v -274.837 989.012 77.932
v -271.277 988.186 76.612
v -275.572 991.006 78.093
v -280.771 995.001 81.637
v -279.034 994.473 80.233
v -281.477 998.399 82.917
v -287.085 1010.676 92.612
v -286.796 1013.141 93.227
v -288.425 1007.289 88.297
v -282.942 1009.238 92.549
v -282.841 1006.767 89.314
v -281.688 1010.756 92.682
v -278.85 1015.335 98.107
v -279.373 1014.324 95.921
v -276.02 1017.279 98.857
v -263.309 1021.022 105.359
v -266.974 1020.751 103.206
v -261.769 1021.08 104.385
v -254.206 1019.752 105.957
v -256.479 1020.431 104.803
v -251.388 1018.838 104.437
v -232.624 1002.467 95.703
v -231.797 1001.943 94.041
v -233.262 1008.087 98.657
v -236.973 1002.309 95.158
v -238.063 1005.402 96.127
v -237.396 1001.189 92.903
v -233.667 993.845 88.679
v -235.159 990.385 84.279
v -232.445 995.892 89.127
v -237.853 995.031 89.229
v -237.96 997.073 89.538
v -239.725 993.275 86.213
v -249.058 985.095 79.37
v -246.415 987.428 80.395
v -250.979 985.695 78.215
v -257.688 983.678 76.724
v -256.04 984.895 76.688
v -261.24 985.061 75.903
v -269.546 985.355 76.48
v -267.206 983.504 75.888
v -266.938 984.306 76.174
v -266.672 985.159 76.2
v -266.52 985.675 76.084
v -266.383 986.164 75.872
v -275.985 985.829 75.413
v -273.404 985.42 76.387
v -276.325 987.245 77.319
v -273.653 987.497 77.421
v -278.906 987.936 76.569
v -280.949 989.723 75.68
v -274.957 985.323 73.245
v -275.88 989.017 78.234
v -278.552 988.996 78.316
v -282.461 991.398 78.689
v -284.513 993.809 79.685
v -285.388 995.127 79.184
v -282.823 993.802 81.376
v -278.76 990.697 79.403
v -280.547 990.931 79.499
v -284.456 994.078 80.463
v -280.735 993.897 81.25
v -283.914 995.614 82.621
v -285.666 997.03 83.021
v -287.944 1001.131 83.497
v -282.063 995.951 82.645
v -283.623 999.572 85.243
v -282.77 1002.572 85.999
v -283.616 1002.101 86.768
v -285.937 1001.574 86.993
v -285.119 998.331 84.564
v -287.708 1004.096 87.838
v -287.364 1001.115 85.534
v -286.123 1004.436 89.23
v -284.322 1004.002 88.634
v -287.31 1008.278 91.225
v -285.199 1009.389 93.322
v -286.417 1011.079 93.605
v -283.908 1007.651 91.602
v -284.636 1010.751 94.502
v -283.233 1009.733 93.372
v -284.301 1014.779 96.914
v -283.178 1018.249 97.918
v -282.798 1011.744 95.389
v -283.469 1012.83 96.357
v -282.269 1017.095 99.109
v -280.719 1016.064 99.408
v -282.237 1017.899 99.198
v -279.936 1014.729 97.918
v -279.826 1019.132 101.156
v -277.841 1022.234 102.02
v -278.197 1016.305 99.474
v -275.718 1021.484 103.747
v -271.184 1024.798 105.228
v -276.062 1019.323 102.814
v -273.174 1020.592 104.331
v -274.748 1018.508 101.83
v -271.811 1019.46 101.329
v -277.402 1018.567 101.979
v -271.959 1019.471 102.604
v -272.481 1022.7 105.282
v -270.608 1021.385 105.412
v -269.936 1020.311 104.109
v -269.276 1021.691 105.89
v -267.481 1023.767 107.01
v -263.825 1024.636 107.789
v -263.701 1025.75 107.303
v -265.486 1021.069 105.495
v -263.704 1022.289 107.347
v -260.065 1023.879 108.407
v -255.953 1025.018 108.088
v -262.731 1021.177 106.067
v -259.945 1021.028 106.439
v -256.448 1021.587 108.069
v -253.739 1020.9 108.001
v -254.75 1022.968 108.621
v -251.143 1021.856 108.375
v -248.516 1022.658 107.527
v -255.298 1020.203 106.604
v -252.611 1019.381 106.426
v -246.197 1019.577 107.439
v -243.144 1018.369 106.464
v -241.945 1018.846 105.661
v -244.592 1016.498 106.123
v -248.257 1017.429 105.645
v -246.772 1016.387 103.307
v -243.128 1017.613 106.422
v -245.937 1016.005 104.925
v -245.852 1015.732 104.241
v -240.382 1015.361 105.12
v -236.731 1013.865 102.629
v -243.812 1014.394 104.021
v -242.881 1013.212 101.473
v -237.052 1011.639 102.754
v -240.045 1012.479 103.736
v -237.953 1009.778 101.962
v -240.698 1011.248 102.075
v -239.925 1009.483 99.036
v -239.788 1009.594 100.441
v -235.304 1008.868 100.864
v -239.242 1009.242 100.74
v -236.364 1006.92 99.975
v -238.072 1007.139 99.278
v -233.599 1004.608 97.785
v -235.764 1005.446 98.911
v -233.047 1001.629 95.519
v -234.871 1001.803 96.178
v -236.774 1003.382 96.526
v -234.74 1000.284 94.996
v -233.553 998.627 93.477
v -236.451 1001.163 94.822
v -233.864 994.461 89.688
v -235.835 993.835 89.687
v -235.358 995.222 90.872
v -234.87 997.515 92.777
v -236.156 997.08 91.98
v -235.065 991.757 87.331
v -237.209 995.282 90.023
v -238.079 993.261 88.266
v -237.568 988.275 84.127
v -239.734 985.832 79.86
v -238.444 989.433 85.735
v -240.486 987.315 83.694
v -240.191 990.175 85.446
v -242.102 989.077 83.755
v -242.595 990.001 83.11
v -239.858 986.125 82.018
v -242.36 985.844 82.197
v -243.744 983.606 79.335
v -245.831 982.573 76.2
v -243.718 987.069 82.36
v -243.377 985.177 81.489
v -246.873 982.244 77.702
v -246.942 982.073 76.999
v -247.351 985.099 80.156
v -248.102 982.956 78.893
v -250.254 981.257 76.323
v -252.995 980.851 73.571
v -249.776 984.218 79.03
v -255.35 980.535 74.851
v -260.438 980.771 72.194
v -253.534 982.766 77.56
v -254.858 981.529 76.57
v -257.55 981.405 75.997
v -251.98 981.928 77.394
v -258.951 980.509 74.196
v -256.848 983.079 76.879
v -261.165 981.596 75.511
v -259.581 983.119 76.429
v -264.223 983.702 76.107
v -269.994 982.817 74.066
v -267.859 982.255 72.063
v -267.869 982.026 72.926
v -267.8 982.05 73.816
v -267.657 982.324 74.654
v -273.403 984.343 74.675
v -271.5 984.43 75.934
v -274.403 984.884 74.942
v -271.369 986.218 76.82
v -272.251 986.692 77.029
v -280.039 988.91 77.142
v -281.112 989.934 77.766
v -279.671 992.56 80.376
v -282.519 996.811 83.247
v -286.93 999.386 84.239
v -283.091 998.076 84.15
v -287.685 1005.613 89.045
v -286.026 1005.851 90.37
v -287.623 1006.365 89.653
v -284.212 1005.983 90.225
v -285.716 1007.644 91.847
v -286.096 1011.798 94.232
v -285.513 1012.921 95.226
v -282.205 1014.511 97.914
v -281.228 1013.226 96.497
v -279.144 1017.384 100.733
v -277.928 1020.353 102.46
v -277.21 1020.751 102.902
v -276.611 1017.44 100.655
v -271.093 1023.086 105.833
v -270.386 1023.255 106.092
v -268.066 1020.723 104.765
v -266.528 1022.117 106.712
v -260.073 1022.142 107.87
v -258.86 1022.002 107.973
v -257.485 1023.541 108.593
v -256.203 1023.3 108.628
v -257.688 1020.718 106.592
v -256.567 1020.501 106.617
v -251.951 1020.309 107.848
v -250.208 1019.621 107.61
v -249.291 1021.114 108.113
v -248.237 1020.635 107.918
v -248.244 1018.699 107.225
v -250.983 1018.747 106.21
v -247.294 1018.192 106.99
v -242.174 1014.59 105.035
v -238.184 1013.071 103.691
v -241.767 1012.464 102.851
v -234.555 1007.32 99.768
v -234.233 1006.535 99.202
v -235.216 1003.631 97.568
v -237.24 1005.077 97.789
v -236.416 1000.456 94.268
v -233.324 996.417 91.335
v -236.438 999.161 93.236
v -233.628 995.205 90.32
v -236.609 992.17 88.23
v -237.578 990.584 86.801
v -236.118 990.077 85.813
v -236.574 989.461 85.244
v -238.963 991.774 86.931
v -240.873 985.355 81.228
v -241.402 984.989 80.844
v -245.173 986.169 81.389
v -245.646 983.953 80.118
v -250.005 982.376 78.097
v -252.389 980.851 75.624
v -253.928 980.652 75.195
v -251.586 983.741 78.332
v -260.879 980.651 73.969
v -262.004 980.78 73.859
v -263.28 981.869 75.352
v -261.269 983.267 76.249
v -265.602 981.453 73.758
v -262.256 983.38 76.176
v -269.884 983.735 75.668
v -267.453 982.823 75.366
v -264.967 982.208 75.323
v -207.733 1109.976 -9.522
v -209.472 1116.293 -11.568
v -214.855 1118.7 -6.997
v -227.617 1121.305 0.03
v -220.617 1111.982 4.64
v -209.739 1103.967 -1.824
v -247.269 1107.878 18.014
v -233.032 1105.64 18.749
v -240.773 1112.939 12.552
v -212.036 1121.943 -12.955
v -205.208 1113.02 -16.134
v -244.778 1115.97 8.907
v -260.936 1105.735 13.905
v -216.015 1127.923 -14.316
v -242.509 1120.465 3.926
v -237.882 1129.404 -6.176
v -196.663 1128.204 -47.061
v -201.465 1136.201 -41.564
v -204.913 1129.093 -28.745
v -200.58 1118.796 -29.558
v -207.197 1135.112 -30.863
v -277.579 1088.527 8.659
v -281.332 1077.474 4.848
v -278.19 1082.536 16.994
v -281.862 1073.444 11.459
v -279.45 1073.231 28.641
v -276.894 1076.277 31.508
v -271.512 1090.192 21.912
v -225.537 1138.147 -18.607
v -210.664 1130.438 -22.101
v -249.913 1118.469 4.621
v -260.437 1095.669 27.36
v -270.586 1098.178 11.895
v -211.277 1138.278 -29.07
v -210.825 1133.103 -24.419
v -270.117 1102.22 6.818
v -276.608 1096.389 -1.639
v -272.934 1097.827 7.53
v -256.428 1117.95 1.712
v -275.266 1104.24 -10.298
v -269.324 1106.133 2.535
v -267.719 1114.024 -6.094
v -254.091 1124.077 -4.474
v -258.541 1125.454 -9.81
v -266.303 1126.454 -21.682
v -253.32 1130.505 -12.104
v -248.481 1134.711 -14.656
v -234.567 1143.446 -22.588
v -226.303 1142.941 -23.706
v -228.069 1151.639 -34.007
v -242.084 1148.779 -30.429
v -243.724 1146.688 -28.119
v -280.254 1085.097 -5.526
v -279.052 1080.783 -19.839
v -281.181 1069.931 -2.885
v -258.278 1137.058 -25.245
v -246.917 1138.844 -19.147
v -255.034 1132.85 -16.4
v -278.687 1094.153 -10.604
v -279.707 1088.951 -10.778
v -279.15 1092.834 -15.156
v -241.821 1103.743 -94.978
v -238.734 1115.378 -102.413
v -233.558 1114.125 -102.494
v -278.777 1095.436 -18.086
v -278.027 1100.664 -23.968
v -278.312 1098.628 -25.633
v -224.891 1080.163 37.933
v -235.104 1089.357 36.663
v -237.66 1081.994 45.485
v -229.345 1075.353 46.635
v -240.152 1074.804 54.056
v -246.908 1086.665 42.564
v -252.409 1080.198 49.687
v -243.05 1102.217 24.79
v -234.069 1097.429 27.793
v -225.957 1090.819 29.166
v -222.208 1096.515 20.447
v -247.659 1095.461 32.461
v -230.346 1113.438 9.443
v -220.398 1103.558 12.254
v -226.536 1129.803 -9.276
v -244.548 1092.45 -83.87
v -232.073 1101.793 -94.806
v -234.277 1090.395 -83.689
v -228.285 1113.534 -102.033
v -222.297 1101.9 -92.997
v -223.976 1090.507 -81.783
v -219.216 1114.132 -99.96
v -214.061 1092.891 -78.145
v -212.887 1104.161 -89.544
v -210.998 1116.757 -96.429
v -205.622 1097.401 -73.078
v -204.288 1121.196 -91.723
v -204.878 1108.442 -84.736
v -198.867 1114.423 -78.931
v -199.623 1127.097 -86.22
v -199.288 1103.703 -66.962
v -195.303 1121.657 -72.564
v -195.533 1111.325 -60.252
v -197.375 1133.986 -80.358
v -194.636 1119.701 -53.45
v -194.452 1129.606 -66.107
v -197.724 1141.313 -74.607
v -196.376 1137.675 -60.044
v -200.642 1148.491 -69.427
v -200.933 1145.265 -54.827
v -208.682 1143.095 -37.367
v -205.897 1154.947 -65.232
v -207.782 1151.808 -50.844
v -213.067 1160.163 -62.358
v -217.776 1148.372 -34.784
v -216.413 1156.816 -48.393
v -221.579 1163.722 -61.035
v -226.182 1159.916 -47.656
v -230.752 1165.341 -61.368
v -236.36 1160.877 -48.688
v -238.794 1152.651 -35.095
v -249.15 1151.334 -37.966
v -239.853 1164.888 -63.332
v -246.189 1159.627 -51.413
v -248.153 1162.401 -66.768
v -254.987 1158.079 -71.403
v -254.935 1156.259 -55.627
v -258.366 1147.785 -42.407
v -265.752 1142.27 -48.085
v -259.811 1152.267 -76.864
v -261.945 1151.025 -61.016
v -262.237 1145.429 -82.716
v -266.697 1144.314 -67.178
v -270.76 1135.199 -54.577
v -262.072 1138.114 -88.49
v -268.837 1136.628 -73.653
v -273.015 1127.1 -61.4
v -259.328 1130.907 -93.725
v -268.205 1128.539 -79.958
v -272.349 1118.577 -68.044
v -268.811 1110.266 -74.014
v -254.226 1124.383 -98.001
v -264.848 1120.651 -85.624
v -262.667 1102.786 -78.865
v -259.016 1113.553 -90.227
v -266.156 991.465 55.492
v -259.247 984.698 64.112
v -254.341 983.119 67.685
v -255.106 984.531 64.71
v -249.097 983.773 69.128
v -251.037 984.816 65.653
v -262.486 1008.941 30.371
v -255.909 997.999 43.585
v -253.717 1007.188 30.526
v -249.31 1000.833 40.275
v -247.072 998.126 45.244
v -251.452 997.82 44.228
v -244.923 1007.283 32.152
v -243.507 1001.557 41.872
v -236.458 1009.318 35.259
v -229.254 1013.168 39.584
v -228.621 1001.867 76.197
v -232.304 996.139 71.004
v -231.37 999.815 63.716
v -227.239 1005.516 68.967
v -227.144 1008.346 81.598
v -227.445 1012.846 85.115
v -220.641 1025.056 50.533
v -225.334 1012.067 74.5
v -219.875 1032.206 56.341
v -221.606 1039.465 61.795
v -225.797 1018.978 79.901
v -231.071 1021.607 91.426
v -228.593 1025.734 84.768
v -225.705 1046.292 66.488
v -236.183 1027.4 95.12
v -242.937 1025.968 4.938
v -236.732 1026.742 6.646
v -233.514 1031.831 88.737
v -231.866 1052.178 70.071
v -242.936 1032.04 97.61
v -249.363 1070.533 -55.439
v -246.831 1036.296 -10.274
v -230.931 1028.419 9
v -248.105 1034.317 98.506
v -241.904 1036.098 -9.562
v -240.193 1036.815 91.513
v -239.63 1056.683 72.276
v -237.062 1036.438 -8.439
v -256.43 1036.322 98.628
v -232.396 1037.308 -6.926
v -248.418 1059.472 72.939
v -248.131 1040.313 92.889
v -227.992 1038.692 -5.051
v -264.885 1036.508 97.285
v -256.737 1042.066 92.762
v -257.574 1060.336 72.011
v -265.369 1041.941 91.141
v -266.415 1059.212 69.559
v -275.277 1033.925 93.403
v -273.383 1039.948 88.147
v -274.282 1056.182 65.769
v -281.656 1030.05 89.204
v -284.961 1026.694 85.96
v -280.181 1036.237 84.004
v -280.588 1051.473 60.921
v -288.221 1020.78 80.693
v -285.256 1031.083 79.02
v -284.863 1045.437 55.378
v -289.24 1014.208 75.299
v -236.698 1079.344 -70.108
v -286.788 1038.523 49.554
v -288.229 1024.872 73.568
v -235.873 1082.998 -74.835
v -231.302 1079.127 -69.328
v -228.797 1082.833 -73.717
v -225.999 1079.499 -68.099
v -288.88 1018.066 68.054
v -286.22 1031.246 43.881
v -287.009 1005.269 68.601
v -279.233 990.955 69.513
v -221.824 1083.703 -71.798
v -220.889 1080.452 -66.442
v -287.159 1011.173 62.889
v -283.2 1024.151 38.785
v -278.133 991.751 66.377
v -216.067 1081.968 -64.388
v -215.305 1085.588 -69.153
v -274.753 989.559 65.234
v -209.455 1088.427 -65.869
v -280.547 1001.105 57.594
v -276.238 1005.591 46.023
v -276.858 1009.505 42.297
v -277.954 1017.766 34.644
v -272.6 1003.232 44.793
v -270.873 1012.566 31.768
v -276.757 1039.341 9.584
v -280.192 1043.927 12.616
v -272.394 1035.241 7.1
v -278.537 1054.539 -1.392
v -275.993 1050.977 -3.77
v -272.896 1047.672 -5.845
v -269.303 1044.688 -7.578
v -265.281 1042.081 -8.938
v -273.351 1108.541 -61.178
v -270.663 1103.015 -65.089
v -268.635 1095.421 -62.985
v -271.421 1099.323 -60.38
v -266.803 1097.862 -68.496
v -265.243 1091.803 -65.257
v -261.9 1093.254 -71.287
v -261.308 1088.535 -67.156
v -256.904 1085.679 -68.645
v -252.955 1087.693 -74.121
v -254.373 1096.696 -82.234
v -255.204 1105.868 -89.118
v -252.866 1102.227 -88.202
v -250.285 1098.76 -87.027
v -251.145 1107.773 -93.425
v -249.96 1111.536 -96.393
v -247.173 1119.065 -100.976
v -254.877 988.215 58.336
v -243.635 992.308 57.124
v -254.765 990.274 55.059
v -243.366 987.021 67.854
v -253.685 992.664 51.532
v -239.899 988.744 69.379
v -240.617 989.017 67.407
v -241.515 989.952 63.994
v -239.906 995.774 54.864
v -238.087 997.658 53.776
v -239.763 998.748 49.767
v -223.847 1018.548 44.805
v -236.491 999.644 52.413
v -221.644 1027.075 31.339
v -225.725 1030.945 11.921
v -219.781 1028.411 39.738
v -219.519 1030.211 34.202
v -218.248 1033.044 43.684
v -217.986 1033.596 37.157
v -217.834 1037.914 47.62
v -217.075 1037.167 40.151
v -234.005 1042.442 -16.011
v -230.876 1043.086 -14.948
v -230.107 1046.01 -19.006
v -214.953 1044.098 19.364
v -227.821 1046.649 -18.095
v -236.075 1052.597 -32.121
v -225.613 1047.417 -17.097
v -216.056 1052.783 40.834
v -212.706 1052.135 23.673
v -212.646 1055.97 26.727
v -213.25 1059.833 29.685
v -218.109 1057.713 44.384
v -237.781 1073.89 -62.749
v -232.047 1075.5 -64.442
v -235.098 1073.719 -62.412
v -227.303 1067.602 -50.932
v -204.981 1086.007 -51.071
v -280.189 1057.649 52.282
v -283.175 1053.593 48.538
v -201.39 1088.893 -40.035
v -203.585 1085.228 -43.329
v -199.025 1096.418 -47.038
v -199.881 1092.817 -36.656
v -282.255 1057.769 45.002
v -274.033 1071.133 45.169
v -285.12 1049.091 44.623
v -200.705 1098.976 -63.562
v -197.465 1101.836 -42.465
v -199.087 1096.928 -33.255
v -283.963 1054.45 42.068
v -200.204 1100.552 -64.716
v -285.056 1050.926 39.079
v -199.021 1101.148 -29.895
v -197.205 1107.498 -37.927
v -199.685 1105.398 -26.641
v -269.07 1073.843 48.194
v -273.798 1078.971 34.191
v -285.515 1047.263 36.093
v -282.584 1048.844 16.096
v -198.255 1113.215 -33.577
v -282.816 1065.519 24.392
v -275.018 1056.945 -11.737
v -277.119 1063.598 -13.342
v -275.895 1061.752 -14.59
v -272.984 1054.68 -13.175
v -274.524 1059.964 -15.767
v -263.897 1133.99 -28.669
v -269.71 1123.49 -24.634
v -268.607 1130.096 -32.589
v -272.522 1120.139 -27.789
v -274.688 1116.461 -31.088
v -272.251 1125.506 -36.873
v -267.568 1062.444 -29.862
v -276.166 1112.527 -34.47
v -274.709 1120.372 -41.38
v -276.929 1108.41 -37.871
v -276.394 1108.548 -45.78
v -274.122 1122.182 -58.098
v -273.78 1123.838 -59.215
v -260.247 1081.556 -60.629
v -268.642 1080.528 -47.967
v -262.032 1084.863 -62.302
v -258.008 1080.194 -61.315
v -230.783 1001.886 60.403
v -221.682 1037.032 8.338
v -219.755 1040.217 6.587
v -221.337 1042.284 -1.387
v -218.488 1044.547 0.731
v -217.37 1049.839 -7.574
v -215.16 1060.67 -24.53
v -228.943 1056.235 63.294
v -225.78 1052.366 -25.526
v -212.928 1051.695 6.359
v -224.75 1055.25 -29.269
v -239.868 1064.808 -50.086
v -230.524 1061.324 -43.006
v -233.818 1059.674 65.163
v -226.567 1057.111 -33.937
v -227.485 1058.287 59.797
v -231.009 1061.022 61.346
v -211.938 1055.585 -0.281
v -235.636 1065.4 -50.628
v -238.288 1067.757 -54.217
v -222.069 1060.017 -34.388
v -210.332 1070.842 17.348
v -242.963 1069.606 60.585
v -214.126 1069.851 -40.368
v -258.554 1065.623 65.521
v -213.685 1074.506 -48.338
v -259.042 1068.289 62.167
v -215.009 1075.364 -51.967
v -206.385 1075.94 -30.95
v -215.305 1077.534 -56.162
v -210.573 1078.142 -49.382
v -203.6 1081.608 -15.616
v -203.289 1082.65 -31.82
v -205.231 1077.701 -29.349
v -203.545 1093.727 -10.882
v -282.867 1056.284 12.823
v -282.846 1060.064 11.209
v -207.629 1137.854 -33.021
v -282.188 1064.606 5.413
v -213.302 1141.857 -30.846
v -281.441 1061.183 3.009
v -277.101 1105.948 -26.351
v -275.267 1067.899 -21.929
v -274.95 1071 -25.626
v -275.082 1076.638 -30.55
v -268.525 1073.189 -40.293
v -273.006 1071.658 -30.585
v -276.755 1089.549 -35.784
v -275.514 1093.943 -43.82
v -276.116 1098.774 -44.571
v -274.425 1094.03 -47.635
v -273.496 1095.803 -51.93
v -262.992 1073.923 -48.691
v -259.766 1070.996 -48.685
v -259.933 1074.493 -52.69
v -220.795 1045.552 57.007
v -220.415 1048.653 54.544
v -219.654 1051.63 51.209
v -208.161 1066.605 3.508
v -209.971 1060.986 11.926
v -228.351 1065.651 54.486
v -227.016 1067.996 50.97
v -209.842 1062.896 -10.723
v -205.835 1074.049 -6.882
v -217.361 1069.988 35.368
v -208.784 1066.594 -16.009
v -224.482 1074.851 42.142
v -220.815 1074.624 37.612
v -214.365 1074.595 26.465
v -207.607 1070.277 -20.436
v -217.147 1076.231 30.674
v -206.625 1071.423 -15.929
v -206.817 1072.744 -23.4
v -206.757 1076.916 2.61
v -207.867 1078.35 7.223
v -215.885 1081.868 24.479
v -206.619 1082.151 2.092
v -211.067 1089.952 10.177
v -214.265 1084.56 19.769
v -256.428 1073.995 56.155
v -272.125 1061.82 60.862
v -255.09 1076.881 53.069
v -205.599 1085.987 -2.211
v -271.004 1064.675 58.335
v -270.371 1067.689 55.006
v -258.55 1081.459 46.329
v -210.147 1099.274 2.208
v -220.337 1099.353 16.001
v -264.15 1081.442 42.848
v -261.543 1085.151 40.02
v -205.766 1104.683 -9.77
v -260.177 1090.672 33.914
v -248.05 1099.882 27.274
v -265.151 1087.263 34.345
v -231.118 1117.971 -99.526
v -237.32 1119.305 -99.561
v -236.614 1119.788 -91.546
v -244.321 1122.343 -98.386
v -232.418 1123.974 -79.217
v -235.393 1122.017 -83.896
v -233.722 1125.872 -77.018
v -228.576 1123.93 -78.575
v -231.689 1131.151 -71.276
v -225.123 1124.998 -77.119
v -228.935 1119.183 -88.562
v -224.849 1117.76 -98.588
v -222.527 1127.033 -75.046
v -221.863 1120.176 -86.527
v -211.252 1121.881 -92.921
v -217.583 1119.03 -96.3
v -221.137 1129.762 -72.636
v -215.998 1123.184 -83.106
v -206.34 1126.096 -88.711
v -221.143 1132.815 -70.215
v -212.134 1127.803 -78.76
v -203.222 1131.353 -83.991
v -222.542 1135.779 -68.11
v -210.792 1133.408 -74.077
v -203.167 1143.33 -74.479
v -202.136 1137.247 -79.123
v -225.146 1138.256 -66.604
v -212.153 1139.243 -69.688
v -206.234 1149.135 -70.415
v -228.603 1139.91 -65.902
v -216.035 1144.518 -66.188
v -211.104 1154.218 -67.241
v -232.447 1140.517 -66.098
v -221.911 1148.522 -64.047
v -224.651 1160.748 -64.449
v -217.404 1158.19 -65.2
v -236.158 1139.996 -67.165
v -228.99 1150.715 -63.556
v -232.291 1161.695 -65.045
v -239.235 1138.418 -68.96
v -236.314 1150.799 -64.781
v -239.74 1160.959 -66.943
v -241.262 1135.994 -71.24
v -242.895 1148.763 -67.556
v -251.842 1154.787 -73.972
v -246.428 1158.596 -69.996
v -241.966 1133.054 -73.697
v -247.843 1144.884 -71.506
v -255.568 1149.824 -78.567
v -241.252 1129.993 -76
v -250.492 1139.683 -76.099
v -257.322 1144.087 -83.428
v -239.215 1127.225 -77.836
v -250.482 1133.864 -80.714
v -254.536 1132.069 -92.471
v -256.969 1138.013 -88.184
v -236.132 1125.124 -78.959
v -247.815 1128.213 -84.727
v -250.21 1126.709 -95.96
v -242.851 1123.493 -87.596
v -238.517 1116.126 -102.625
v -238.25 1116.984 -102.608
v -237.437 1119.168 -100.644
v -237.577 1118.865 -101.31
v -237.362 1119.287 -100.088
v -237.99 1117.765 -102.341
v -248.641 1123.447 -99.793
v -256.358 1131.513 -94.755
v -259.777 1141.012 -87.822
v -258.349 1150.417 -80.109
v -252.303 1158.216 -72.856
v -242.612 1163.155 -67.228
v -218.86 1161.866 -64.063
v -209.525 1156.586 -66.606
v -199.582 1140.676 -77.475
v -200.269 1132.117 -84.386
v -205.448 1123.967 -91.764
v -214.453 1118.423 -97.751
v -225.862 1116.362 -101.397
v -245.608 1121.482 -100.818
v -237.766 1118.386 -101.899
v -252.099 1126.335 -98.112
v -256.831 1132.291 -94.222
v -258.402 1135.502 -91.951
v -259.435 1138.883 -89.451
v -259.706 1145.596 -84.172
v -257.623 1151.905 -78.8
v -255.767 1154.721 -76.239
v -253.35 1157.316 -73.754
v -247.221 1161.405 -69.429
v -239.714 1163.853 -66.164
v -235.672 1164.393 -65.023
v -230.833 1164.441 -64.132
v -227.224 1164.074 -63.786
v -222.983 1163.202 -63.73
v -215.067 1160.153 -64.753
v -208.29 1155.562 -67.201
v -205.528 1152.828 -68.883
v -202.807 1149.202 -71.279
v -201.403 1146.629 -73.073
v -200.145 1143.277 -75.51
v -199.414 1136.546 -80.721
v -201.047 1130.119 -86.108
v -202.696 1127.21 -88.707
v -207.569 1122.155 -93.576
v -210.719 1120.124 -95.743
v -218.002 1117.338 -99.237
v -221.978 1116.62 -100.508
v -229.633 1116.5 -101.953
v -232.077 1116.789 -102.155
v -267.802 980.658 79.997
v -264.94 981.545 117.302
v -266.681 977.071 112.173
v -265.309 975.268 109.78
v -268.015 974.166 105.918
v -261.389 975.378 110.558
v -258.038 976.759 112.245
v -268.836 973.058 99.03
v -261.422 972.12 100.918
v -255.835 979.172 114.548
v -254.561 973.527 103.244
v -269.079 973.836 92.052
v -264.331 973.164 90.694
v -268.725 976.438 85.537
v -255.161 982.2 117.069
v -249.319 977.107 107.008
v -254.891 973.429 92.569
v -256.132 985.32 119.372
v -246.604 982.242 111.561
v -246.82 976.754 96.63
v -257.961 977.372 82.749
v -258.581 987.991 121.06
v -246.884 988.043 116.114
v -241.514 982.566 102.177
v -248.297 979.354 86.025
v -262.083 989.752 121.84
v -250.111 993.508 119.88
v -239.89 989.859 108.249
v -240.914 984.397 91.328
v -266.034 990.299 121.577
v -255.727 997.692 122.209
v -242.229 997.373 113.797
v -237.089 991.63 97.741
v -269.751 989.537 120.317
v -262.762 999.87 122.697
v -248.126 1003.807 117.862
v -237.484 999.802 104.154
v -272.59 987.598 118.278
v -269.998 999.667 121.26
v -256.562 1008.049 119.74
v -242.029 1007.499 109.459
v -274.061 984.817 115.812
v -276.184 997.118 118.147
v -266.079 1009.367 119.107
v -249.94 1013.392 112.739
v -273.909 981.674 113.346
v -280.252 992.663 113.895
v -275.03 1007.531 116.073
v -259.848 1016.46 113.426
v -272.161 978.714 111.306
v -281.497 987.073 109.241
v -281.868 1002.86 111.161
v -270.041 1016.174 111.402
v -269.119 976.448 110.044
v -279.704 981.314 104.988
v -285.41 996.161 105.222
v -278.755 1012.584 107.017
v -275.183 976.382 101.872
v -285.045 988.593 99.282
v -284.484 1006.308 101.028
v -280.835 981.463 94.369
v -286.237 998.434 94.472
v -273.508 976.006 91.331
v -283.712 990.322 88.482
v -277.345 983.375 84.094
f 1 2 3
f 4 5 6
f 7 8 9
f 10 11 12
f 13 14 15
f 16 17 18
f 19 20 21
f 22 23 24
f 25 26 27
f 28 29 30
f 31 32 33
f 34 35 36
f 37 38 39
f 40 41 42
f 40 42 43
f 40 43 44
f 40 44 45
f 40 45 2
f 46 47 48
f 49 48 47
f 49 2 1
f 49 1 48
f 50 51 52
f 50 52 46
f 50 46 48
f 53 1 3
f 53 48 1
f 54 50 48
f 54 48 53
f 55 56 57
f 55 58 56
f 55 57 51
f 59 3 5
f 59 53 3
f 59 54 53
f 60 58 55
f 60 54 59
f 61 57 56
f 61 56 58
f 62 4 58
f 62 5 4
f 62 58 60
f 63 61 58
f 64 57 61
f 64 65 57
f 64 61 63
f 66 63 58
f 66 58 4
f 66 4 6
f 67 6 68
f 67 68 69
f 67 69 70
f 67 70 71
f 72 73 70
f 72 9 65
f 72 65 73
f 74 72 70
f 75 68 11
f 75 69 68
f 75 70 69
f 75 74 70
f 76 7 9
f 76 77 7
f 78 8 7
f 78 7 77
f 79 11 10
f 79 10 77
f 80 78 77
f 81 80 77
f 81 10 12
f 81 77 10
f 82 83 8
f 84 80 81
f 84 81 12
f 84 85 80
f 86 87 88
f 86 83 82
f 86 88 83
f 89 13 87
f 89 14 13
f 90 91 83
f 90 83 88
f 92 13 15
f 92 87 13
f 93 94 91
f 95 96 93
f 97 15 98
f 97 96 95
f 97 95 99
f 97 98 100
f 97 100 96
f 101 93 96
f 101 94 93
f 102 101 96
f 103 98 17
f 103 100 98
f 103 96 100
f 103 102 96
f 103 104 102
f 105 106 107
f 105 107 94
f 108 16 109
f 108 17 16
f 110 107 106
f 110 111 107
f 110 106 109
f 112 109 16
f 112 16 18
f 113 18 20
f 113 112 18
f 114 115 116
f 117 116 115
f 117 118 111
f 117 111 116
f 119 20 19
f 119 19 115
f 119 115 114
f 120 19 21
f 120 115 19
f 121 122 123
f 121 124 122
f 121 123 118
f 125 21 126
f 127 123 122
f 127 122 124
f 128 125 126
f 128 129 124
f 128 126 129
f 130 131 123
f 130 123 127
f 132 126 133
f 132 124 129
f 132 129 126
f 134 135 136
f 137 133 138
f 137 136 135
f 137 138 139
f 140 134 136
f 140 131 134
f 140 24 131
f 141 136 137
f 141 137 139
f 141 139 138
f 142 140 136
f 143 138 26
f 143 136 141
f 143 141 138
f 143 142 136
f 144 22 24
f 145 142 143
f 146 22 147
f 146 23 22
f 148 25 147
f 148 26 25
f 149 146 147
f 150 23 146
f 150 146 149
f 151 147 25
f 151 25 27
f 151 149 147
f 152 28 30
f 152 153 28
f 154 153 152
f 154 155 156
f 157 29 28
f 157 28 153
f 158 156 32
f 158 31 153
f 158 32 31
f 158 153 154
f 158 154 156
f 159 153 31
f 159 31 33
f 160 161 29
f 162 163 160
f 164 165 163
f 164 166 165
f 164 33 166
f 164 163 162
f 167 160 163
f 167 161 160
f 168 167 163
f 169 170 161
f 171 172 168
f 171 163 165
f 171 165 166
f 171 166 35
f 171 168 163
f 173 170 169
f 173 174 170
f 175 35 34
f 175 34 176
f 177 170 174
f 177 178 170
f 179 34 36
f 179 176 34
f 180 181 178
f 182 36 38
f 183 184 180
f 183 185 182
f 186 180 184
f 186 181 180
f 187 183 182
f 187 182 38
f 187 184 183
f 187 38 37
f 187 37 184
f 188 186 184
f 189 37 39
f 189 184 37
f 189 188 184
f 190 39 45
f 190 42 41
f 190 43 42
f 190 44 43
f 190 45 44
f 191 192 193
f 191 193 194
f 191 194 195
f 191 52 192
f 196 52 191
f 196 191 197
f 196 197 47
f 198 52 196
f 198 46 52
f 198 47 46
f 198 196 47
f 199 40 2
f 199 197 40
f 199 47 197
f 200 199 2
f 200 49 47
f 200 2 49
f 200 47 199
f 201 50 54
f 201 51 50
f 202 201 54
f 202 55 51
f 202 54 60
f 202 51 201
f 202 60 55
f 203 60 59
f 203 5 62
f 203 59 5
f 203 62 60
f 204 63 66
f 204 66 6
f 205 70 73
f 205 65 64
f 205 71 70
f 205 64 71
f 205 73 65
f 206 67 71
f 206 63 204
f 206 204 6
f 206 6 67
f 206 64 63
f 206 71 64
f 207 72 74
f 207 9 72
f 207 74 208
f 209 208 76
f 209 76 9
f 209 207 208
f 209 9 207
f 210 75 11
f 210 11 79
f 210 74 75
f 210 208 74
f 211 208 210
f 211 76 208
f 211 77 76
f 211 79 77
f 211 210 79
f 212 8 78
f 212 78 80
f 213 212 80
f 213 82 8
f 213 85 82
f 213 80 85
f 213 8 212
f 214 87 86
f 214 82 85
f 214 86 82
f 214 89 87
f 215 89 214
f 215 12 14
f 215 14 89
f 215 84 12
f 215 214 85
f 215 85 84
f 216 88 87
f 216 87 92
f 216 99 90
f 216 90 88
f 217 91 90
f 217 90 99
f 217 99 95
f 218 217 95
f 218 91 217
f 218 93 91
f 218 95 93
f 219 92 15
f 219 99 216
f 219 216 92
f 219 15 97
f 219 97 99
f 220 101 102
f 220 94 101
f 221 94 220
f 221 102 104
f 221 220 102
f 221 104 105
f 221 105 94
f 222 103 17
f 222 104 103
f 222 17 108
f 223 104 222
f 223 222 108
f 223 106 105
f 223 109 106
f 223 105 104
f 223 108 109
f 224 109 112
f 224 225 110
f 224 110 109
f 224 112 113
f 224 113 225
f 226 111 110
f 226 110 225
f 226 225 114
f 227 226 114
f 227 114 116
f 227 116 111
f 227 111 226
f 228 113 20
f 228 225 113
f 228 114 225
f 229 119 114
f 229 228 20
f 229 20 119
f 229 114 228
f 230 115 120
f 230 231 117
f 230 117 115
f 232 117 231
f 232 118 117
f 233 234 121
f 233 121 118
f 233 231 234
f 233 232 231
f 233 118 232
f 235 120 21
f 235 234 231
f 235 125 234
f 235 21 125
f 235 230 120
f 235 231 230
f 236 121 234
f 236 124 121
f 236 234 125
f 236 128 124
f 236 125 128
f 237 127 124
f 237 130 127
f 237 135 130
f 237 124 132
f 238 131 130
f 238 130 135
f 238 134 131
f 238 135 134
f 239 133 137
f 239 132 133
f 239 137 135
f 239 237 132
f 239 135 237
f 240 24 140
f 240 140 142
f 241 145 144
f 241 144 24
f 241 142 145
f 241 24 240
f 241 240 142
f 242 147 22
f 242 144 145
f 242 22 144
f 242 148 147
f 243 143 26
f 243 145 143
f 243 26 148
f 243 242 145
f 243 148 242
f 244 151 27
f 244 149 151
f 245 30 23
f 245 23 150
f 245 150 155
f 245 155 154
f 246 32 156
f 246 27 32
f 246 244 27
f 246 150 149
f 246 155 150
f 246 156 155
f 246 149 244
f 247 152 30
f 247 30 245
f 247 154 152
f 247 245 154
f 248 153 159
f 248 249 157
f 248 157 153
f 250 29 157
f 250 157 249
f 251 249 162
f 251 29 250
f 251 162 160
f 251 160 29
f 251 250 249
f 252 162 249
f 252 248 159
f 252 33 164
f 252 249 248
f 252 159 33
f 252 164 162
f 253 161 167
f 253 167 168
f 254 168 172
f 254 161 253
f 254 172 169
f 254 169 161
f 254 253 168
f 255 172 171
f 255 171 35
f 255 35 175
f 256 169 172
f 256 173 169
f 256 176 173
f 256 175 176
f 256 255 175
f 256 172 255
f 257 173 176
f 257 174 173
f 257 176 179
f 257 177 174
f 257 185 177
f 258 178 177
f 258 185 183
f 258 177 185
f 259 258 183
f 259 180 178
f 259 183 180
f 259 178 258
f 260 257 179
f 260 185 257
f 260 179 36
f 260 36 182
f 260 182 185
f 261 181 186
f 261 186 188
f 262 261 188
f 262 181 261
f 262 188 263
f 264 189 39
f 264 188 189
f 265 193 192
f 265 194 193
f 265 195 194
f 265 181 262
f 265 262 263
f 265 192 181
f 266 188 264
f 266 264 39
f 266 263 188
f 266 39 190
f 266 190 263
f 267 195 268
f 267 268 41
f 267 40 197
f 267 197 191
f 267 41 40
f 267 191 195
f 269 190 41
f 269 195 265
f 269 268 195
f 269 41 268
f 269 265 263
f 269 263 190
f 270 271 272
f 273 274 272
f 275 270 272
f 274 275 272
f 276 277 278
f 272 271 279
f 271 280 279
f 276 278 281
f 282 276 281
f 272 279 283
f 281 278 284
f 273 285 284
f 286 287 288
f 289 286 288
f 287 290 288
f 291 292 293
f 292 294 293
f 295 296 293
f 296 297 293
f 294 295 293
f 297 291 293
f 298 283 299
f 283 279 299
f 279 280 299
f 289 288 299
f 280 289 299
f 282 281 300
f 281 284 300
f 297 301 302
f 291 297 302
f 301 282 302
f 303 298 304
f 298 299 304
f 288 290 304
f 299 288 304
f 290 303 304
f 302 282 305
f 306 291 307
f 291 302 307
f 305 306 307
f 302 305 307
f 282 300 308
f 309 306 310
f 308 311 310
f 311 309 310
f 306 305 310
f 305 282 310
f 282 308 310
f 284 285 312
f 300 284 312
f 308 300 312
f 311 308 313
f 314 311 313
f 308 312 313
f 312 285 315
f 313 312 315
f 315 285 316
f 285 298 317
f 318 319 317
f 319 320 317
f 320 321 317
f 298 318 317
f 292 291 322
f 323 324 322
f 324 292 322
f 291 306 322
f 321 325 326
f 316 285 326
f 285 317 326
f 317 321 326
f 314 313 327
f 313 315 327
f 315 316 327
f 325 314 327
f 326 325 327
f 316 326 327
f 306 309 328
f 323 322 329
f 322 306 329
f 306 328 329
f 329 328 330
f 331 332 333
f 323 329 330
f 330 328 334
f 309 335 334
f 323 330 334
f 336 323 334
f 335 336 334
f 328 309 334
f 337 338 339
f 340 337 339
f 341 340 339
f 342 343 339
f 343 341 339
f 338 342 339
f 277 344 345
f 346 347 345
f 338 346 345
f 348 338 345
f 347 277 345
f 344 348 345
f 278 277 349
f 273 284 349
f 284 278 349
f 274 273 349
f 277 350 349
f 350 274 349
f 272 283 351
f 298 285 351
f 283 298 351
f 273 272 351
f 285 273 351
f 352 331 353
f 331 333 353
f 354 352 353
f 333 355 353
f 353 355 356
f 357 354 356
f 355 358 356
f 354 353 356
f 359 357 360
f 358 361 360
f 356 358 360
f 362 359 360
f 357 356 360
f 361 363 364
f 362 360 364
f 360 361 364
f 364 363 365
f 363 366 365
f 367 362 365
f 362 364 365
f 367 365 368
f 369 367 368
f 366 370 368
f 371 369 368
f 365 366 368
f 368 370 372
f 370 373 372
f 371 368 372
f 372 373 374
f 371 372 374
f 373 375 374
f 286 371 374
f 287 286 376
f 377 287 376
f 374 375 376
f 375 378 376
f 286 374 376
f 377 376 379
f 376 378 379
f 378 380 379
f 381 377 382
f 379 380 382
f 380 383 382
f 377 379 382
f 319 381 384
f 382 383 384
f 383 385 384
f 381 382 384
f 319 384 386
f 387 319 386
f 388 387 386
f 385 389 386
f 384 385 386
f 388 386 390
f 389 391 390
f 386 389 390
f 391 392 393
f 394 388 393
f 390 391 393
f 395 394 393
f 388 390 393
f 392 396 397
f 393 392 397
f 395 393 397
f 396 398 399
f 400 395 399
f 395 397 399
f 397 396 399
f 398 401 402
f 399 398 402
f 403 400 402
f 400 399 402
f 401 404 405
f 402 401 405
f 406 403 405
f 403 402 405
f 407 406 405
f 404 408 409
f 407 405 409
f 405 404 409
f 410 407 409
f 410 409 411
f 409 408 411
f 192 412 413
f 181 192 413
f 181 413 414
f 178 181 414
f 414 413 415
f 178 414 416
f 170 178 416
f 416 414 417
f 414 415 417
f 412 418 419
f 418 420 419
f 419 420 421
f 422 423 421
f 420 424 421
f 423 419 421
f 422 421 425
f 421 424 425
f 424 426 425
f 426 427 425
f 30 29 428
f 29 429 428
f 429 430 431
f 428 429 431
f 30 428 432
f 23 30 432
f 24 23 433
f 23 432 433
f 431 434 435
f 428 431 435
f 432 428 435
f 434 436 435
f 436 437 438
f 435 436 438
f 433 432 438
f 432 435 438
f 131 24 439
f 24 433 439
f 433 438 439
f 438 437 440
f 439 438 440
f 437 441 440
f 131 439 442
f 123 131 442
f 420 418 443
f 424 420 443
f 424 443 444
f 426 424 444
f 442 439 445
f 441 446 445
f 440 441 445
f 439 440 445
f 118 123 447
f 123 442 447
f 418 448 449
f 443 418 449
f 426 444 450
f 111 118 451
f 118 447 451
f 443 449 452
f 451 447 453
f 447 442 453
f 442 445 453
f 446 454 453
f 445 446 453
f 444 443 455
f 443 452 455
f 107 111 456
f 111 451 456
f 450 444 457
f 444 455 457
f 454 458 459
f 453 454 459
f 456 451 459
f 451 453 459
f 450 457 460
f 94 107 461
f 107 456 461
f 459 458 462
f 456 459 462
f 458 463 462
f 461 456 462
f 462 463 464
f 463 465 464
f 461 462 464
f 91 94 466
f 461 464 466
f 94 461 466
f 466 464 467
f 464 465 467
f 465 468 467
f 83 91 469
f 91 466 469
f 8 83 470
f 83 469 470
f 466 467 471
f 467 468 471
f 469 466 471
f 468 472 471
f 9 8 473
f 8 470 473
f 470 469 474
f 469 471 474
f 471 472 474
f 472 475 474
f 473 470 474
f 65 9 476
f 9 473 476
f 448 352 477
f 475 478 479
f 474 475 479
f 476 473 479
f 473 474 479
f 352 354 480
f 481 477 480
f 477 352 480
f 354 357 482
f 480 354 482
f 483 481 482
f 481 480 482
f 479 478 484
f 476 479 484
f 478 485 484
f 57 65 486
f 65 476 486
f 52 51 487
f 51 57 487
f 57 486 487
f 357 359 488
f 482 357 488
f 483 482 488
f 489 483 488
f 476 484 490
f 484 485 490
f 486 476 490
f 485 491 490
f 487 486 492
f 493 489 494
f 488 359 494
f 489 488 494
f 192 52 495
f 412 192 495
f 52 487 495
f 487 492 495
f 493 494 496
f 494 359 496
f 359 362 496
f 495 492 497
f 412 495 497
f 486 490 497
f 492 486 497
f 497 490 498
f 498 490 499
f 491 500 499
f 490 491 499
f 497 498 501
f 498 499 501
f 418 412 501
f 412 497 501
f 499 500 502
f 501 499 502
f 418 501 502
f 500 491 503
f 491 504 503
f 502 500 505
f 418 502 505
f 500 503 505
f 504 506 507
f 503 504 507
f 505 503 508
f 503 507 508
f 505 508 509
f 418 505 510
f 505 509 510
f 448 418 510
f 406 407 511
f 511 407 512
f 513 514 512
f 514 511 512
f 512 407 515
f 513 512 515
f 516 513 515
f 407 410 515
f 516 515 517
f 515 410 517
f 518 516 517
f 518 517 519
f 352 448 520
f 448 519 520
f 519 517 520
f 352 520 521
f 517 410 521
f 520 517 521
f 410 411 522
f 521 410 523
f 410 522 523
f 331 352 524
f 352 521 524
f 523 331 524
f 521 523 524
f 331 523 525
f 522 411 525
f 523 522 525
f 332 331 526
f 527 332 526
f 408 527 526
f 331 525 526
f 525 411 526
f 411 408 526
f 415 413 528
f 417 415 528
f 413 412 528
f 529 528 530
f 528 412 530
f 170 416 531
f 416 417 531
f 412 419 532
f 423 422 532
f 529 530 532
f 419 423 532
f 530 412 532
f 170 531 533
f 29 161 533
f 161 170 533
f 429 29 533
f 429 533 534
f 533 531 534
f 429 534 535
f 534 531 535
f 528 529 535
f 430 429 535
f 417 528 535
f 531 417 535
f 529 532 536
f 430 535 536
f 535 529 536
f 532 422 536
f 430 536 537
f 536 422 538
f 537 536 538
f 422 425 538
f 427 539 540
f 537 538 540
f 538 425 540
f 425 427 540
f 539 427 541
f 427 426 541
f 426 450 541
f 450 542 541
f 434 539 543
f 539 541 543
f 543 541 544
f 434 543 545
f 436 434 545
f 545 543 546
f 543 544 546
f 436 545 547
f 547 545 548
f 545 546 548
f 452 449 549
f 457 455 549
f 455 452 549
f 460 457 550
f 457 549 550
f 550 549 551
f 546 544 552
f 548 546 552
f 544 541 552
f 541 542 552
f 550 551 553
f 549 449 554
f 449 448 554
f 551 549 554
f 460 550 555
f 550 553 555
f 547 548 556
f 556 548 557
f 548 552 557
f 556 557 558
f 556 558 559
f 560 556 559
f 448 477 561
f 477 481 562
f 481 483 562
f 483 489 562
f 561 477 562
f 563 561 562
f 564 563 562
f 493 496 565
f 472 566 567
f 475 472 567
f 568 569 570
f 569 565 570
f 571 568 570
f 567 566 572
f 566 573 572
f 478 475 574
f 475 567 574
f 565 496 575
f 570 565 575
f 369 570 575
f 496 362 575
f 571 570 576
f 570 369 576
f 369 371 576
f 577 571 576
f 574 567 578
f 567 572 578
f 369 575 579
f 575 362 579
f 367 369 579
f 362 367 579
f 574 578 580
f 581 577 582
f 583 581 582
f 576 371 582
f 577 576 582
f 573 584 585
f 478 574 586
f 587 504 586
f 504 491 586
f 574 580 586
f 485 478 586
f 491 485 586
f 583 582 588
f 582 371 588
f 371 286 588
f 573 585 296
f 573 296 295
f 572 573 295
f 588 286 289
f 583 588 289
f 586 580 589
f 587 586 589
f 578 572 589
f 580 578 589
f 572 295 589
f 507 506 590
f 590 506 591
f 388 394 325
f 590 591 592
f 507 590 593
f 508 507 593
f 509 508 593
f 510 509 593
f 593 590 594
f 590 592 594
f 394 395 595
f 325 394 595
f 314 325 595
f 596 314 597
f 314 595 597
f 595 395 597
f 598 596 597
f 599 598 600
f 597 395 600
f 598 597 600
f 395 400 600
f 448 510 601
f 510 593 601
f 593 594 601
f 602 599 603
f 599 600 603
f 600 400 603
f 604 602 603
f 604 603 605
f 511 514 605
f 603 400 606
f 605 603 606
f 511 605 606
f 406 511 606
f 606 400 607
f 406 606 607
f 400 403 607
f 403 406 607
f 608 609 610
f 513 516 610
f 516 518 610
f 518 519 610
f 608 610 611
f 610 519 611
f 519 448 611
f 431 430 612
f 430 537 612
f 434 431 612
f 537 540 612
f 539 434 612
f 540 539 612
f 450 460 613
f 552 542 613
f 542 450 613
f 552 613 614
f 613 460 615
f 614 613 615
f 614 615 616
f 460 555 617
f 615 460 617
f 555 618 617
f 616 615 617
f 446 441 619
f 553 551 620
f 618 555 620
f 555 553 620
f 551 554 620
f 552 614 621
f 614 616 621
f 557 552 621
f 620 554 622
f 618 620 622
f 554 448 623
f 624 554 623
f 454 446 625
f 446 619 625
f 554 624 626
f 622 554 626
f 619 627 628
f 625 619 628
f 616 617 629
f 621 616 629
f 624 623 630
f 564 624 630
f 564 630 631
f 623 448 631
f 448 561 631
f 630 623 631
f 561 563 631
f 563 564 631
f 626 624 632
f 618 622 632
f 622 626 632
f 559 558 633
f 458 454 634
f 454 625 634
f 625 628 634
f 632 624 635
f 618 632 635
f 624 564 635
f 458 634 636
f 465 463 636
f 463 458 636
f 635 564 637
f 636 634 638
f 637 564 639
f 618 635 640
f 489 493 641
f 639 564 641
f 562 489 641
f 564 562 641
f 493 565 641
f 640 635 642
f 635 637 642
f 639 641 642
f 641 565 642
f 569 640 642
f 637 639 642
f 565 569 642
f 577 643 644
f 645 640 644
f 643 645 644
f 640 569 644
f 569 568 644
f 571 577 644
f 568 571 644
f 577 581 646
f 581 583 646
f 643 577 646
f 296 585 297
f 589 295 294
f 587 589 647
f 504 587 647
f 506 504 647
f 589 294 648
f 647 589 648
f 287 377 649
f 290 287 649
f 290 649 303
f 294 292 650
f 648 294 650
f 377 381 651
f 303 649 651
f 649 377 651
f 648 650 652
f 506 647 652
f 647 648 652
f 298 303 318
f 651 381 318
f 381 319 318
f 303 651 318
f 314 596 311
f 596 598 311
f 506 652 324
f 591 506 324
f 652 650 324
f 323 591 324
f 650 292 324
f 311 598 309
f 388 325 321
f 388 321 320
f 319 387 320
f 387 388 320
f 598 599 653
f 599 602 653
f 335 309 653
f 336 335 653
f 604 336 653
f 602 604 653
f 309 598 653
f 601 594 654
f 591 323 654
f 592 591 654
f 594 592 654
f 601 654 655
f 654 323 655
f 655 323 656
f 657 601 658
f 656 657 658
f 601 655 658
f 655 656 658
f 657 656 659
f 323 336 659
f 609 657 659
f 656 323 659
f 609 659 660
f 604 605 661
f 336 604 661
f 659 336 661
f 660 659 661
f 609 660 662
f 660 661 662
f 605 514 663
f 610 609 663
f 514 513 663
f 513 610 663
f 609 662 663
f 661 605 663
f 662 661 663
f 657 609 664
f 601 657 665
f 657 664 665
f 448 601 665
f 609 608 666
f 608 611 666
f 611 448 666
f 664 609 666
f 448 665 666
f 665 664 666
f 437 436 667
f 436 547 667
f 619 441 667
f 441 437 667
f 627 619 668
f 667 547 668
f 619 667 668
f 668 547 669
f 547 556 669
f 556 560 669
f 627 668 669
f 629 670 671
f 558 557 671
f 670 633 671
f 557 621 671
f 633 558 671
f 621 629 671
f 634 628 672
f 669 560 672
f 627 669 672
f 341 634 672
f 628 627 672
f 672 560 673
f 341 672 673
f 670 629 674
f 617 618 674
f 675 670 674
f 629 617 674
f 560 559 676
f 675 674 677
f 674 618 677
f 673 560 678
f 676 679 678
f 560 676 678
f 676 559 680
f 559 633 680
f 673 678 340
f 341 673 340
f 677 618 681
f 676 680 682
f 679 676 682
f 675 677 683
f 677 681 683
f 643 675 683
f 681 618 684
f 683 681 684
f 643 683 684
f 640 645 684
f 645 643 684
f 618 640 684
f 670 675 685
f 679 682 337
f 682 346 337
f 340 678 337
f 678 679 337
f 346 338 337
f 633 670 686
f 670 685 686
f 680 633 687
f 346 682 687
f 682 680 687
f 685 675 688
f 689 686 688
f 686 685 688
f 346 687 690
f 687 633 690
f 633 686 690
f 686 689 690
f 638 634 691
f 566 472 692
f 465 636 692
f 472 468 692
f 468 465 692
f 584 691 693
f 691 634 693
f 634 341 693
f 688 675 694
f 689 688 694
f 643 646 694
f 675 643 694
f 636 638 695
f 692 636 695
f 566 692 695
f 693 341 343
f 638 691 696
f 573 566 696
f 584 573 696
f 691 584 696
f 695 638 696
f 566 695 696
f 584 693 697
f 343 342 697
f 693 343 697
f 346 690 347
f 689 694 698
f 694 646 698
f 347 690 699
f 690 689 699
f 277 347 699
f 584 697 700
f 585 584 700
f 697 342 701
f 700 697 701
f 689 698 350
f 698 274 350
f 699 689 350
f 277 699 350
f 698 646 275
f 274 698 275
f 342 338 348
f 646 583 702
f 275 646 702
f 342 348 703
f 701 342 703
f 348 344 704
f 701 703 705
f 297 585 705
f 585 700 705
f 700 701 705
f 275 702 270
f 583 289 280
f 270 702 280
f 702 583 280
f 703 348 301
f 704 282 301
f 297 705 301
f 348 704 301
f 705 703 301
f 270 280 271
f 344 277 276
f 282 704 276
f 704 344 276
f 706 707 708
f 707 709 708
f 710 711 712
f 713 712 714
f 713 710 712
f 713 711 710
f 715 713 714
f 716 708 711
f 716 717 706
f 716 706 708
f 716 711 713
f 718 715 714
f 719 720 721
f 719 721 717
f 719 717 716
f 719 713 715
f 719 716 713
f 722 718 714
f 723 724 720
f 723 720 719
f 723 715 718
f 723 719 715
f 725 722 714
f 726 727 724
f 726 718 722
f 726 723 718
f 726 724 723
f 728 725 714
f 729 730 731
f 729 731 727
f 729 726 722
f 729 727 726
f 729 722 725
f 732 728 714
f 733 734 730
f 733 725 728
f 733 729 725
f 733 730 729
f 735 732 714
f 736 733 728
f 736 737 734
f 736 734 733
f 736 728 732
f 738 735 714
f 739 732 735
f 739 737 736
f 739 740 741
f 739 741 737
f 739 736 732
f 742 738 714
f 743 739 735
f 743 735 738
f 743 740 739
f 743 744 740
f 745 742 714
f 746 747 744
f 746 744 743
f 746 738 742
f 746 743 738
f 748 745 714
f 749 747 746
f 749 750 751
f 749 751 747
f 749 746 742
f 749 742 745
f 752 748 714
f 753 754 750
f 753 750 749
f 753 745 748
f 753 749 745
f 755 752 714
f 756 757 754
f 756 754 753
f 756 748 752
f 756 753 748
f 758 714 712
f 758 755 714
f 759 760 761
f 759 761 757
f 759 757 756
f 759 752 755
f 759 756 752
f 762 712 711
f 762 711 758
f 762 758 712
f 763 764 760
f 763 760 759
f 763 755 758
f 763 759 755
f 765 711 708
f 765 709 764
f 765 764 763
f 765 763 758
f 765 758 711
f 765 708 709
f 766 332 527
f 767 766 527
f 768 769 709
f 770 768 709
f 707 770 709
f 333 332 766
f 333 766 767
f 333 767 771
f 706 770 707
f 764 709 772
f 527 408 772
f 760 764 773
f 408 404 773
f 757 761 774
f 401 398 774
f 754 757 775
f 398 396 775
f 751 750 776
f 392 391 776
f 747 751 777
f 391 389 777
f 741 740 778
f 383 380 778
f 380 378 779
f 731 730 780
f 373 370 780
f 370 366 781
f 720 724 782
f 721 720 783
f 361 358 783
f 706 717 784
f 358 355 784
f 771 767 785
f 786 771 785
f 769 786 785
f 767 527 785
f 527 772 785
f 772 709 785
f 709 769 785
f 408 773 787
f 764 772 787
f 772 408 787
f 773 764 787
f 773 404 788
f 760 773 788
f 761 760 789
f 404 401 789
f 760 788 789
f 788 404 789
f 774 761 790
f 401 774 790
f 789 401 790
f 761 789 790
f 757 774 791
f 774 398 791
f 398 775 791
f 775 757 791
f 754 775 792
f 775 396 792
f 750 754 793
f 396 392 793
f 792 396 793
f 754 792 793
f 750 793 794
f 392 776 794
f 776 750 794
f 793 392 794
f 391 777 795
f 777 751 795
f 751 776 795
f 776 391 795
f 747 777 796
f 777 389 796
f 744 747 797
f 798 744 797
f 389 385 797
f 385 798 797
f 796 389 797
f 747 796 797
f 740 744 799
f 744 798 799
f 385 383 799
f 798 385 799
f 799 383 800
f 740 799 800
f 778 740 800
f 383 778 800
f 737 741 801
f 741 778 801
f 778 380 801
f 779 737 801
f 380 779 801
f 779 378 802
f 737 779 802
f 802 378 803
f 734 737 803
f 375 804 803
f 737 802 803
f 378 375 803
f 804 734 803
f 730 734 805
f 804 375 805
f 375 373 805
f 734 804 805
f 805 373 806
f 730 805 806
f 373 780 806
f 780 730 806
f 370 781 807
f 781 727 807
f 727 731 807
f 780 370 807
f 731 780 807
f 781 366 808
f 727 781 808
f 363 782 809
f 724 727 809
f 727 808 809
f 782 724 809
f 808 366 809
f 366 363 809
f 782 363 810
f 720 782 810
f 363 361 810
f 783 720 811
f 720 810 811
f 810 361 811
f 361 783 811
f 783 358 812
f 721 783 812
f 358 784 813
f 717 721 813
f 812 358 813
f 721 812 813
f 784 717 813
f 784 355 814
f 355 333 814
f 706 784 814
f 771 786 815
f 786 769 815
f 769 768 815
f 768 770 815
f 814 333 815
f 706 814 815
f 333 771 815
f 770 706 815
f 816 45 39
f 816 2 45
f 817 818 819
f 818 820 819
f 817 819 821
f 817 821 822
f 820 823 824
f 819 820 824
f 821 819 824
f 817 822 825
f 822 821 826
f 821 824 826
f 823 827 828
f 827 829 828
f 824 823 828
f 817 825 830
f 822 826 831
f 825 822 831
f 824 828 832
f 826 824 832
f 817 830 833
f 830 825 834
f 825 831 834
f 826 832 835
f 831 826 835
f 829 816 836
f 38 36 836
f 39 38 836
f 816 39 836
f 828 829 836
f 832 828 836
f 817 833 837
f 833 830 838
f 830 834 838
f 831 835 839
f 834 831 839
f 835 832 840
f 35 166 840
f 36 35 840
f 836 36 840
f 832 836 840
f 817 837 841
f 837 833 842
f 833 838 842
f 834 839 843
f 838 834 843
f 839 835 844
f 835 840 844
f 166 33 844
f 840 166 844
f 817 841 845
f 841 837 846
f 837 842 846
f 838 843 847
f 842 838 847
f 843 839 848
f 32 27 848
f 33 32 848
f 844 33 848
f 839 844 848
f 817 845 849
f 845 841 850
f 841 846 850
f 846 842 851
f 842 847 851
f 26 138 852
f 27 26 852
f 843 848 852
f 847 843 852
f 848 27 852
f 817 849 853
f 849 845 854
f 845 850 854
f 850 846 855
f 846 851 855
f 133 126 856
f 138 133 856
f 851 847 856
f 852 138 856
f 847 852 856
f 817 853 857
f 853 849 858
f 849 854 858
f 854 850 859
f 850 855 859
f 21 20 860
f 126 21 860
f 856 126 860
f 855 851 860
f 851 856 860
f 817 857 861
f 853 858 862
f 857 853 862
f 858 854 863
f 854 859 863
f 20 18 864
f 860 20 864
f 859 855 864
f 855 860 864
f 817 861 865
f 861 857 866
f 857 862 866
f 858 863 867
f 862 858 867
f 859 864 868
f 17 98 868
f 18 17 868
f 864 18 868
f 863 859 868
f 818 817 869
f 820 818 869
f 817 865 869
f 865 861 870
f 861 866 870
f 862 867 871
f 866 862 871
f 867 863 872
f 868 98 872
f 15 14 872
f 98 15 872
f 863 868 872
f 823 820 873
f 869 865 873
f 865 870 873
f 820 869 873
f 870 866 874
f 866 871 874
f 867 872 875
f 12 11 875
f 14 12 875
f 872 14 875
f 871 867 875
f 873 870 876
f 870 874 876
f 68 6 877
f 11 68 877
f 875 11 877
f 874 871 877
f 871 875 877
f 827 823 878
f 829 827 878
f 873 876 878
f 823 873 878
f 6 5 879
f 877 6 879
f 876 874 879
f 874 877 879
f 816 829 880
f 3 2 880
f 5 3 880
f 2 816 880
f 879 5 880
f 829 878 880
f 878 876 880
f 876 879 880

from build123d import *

# Parameters (mm, degrees)
FILLET093_R             = 3
FILLET094_R             = 3
BODY056_ROLL_ANGLE      = -96.018155
BODY056_PITCH_ANGLE     = -50.899336
BODY056_PLACEMENT_ANGLE = -102.530845


with BuildPart() as part:
    # Sketch188 → Revolution097 (revolve)
    with BuildSketch(Plane.XY):
        with BuildLine():
            Line((5.147949, 0), (267.265, 0))
            add(Edge.make_bspline(
                [(267.265, 0), (263.840897, 29.07099), (216.842712, 33.126465), (91.435905, 38.640092), (3.238657, 43.599544), (5.147949, 0)],
                knots=[0, 0, 0, 0, 0.333333, 0.666667, 1, 1, 1, 1], degree=3))
        make_face()
    revolve(axis=Axis((0, 0, 0), (1, 0, 0)))

    # Sketch189 → Groove091 (revolve, cut)
    with BuildSketch(Plane.XY):
        with BuildLine():
            Line((-35, 0), (35, 0))
            ThreePointArc((35, 0), (0, 35), (-35, 0))
        make_face()
    revolve(axis=Axis((0, 0, 0), (1, 0, 0)), mode=Mode.SUBTRACT)

    # Fillet093
    fillet093_edges = [part.edges().sort_by_distance(p)[0] for p in [
        (17.386166, -30.376327, 0),
    ]]
    fillet(fillet093_edges, radius=FILLET093_R)

    # Sketch190 → Groove092 (revolve, cut)
    with BuildSketch(Plane.XY):
        with BuildLine():
            Line((228, 0), (278, 0))
            ThreePointArc((278, 0), (253, 25), (228, 0))
        make_face()
    revolve(axis=Axis((0, 0, 0), (1, 0, 0)), mode=Mode.SUBTRACT)

    # Fillet094
    fillet094_edges = [part.edges().sort_by_distance(p)[0] for p in [
        (251.985595, -24.979411, 0),
    ]]
    fillet(fillet094_edges, radius=FILLET094_R)

    # Sketch190 → Revolution098 (revolve)
    with BuildSketch(Plane.XY):
        with BuildLine():
            Line((228, 0), (278, 0))
            ThreePointArc((278, 0), (253, 25), (228, 0))
        make_face()
    revolve(axis=Axis((0, 0, 0), (1, 0, 0)))


with BuildPart() as part_1:
    # Body056 roll: moved
    add(part.part.rotate(Axis((0, 0, 0), (1, 0, 0)), BODY056_ROLL_ANGLE))


with BuildPart() as part_2:
    # Body056 pitch: moved
    add(part_1.part.rotate(Axis((0, 0, 0), (0, 1, 0)), BODY056_PITCH_ANGLE))


with BuildPart() as part_3:
    # Body056 placement: moved
    add(part_2.part.moved(Location((-226.899274, 1152.699159, -98.437059))).rotate(Axis((-226.899274, 1152.699159, -98.437059), (0, 0, 1)), BODY056_PLACEMENT_ANGLE))


solid = part_3.part
